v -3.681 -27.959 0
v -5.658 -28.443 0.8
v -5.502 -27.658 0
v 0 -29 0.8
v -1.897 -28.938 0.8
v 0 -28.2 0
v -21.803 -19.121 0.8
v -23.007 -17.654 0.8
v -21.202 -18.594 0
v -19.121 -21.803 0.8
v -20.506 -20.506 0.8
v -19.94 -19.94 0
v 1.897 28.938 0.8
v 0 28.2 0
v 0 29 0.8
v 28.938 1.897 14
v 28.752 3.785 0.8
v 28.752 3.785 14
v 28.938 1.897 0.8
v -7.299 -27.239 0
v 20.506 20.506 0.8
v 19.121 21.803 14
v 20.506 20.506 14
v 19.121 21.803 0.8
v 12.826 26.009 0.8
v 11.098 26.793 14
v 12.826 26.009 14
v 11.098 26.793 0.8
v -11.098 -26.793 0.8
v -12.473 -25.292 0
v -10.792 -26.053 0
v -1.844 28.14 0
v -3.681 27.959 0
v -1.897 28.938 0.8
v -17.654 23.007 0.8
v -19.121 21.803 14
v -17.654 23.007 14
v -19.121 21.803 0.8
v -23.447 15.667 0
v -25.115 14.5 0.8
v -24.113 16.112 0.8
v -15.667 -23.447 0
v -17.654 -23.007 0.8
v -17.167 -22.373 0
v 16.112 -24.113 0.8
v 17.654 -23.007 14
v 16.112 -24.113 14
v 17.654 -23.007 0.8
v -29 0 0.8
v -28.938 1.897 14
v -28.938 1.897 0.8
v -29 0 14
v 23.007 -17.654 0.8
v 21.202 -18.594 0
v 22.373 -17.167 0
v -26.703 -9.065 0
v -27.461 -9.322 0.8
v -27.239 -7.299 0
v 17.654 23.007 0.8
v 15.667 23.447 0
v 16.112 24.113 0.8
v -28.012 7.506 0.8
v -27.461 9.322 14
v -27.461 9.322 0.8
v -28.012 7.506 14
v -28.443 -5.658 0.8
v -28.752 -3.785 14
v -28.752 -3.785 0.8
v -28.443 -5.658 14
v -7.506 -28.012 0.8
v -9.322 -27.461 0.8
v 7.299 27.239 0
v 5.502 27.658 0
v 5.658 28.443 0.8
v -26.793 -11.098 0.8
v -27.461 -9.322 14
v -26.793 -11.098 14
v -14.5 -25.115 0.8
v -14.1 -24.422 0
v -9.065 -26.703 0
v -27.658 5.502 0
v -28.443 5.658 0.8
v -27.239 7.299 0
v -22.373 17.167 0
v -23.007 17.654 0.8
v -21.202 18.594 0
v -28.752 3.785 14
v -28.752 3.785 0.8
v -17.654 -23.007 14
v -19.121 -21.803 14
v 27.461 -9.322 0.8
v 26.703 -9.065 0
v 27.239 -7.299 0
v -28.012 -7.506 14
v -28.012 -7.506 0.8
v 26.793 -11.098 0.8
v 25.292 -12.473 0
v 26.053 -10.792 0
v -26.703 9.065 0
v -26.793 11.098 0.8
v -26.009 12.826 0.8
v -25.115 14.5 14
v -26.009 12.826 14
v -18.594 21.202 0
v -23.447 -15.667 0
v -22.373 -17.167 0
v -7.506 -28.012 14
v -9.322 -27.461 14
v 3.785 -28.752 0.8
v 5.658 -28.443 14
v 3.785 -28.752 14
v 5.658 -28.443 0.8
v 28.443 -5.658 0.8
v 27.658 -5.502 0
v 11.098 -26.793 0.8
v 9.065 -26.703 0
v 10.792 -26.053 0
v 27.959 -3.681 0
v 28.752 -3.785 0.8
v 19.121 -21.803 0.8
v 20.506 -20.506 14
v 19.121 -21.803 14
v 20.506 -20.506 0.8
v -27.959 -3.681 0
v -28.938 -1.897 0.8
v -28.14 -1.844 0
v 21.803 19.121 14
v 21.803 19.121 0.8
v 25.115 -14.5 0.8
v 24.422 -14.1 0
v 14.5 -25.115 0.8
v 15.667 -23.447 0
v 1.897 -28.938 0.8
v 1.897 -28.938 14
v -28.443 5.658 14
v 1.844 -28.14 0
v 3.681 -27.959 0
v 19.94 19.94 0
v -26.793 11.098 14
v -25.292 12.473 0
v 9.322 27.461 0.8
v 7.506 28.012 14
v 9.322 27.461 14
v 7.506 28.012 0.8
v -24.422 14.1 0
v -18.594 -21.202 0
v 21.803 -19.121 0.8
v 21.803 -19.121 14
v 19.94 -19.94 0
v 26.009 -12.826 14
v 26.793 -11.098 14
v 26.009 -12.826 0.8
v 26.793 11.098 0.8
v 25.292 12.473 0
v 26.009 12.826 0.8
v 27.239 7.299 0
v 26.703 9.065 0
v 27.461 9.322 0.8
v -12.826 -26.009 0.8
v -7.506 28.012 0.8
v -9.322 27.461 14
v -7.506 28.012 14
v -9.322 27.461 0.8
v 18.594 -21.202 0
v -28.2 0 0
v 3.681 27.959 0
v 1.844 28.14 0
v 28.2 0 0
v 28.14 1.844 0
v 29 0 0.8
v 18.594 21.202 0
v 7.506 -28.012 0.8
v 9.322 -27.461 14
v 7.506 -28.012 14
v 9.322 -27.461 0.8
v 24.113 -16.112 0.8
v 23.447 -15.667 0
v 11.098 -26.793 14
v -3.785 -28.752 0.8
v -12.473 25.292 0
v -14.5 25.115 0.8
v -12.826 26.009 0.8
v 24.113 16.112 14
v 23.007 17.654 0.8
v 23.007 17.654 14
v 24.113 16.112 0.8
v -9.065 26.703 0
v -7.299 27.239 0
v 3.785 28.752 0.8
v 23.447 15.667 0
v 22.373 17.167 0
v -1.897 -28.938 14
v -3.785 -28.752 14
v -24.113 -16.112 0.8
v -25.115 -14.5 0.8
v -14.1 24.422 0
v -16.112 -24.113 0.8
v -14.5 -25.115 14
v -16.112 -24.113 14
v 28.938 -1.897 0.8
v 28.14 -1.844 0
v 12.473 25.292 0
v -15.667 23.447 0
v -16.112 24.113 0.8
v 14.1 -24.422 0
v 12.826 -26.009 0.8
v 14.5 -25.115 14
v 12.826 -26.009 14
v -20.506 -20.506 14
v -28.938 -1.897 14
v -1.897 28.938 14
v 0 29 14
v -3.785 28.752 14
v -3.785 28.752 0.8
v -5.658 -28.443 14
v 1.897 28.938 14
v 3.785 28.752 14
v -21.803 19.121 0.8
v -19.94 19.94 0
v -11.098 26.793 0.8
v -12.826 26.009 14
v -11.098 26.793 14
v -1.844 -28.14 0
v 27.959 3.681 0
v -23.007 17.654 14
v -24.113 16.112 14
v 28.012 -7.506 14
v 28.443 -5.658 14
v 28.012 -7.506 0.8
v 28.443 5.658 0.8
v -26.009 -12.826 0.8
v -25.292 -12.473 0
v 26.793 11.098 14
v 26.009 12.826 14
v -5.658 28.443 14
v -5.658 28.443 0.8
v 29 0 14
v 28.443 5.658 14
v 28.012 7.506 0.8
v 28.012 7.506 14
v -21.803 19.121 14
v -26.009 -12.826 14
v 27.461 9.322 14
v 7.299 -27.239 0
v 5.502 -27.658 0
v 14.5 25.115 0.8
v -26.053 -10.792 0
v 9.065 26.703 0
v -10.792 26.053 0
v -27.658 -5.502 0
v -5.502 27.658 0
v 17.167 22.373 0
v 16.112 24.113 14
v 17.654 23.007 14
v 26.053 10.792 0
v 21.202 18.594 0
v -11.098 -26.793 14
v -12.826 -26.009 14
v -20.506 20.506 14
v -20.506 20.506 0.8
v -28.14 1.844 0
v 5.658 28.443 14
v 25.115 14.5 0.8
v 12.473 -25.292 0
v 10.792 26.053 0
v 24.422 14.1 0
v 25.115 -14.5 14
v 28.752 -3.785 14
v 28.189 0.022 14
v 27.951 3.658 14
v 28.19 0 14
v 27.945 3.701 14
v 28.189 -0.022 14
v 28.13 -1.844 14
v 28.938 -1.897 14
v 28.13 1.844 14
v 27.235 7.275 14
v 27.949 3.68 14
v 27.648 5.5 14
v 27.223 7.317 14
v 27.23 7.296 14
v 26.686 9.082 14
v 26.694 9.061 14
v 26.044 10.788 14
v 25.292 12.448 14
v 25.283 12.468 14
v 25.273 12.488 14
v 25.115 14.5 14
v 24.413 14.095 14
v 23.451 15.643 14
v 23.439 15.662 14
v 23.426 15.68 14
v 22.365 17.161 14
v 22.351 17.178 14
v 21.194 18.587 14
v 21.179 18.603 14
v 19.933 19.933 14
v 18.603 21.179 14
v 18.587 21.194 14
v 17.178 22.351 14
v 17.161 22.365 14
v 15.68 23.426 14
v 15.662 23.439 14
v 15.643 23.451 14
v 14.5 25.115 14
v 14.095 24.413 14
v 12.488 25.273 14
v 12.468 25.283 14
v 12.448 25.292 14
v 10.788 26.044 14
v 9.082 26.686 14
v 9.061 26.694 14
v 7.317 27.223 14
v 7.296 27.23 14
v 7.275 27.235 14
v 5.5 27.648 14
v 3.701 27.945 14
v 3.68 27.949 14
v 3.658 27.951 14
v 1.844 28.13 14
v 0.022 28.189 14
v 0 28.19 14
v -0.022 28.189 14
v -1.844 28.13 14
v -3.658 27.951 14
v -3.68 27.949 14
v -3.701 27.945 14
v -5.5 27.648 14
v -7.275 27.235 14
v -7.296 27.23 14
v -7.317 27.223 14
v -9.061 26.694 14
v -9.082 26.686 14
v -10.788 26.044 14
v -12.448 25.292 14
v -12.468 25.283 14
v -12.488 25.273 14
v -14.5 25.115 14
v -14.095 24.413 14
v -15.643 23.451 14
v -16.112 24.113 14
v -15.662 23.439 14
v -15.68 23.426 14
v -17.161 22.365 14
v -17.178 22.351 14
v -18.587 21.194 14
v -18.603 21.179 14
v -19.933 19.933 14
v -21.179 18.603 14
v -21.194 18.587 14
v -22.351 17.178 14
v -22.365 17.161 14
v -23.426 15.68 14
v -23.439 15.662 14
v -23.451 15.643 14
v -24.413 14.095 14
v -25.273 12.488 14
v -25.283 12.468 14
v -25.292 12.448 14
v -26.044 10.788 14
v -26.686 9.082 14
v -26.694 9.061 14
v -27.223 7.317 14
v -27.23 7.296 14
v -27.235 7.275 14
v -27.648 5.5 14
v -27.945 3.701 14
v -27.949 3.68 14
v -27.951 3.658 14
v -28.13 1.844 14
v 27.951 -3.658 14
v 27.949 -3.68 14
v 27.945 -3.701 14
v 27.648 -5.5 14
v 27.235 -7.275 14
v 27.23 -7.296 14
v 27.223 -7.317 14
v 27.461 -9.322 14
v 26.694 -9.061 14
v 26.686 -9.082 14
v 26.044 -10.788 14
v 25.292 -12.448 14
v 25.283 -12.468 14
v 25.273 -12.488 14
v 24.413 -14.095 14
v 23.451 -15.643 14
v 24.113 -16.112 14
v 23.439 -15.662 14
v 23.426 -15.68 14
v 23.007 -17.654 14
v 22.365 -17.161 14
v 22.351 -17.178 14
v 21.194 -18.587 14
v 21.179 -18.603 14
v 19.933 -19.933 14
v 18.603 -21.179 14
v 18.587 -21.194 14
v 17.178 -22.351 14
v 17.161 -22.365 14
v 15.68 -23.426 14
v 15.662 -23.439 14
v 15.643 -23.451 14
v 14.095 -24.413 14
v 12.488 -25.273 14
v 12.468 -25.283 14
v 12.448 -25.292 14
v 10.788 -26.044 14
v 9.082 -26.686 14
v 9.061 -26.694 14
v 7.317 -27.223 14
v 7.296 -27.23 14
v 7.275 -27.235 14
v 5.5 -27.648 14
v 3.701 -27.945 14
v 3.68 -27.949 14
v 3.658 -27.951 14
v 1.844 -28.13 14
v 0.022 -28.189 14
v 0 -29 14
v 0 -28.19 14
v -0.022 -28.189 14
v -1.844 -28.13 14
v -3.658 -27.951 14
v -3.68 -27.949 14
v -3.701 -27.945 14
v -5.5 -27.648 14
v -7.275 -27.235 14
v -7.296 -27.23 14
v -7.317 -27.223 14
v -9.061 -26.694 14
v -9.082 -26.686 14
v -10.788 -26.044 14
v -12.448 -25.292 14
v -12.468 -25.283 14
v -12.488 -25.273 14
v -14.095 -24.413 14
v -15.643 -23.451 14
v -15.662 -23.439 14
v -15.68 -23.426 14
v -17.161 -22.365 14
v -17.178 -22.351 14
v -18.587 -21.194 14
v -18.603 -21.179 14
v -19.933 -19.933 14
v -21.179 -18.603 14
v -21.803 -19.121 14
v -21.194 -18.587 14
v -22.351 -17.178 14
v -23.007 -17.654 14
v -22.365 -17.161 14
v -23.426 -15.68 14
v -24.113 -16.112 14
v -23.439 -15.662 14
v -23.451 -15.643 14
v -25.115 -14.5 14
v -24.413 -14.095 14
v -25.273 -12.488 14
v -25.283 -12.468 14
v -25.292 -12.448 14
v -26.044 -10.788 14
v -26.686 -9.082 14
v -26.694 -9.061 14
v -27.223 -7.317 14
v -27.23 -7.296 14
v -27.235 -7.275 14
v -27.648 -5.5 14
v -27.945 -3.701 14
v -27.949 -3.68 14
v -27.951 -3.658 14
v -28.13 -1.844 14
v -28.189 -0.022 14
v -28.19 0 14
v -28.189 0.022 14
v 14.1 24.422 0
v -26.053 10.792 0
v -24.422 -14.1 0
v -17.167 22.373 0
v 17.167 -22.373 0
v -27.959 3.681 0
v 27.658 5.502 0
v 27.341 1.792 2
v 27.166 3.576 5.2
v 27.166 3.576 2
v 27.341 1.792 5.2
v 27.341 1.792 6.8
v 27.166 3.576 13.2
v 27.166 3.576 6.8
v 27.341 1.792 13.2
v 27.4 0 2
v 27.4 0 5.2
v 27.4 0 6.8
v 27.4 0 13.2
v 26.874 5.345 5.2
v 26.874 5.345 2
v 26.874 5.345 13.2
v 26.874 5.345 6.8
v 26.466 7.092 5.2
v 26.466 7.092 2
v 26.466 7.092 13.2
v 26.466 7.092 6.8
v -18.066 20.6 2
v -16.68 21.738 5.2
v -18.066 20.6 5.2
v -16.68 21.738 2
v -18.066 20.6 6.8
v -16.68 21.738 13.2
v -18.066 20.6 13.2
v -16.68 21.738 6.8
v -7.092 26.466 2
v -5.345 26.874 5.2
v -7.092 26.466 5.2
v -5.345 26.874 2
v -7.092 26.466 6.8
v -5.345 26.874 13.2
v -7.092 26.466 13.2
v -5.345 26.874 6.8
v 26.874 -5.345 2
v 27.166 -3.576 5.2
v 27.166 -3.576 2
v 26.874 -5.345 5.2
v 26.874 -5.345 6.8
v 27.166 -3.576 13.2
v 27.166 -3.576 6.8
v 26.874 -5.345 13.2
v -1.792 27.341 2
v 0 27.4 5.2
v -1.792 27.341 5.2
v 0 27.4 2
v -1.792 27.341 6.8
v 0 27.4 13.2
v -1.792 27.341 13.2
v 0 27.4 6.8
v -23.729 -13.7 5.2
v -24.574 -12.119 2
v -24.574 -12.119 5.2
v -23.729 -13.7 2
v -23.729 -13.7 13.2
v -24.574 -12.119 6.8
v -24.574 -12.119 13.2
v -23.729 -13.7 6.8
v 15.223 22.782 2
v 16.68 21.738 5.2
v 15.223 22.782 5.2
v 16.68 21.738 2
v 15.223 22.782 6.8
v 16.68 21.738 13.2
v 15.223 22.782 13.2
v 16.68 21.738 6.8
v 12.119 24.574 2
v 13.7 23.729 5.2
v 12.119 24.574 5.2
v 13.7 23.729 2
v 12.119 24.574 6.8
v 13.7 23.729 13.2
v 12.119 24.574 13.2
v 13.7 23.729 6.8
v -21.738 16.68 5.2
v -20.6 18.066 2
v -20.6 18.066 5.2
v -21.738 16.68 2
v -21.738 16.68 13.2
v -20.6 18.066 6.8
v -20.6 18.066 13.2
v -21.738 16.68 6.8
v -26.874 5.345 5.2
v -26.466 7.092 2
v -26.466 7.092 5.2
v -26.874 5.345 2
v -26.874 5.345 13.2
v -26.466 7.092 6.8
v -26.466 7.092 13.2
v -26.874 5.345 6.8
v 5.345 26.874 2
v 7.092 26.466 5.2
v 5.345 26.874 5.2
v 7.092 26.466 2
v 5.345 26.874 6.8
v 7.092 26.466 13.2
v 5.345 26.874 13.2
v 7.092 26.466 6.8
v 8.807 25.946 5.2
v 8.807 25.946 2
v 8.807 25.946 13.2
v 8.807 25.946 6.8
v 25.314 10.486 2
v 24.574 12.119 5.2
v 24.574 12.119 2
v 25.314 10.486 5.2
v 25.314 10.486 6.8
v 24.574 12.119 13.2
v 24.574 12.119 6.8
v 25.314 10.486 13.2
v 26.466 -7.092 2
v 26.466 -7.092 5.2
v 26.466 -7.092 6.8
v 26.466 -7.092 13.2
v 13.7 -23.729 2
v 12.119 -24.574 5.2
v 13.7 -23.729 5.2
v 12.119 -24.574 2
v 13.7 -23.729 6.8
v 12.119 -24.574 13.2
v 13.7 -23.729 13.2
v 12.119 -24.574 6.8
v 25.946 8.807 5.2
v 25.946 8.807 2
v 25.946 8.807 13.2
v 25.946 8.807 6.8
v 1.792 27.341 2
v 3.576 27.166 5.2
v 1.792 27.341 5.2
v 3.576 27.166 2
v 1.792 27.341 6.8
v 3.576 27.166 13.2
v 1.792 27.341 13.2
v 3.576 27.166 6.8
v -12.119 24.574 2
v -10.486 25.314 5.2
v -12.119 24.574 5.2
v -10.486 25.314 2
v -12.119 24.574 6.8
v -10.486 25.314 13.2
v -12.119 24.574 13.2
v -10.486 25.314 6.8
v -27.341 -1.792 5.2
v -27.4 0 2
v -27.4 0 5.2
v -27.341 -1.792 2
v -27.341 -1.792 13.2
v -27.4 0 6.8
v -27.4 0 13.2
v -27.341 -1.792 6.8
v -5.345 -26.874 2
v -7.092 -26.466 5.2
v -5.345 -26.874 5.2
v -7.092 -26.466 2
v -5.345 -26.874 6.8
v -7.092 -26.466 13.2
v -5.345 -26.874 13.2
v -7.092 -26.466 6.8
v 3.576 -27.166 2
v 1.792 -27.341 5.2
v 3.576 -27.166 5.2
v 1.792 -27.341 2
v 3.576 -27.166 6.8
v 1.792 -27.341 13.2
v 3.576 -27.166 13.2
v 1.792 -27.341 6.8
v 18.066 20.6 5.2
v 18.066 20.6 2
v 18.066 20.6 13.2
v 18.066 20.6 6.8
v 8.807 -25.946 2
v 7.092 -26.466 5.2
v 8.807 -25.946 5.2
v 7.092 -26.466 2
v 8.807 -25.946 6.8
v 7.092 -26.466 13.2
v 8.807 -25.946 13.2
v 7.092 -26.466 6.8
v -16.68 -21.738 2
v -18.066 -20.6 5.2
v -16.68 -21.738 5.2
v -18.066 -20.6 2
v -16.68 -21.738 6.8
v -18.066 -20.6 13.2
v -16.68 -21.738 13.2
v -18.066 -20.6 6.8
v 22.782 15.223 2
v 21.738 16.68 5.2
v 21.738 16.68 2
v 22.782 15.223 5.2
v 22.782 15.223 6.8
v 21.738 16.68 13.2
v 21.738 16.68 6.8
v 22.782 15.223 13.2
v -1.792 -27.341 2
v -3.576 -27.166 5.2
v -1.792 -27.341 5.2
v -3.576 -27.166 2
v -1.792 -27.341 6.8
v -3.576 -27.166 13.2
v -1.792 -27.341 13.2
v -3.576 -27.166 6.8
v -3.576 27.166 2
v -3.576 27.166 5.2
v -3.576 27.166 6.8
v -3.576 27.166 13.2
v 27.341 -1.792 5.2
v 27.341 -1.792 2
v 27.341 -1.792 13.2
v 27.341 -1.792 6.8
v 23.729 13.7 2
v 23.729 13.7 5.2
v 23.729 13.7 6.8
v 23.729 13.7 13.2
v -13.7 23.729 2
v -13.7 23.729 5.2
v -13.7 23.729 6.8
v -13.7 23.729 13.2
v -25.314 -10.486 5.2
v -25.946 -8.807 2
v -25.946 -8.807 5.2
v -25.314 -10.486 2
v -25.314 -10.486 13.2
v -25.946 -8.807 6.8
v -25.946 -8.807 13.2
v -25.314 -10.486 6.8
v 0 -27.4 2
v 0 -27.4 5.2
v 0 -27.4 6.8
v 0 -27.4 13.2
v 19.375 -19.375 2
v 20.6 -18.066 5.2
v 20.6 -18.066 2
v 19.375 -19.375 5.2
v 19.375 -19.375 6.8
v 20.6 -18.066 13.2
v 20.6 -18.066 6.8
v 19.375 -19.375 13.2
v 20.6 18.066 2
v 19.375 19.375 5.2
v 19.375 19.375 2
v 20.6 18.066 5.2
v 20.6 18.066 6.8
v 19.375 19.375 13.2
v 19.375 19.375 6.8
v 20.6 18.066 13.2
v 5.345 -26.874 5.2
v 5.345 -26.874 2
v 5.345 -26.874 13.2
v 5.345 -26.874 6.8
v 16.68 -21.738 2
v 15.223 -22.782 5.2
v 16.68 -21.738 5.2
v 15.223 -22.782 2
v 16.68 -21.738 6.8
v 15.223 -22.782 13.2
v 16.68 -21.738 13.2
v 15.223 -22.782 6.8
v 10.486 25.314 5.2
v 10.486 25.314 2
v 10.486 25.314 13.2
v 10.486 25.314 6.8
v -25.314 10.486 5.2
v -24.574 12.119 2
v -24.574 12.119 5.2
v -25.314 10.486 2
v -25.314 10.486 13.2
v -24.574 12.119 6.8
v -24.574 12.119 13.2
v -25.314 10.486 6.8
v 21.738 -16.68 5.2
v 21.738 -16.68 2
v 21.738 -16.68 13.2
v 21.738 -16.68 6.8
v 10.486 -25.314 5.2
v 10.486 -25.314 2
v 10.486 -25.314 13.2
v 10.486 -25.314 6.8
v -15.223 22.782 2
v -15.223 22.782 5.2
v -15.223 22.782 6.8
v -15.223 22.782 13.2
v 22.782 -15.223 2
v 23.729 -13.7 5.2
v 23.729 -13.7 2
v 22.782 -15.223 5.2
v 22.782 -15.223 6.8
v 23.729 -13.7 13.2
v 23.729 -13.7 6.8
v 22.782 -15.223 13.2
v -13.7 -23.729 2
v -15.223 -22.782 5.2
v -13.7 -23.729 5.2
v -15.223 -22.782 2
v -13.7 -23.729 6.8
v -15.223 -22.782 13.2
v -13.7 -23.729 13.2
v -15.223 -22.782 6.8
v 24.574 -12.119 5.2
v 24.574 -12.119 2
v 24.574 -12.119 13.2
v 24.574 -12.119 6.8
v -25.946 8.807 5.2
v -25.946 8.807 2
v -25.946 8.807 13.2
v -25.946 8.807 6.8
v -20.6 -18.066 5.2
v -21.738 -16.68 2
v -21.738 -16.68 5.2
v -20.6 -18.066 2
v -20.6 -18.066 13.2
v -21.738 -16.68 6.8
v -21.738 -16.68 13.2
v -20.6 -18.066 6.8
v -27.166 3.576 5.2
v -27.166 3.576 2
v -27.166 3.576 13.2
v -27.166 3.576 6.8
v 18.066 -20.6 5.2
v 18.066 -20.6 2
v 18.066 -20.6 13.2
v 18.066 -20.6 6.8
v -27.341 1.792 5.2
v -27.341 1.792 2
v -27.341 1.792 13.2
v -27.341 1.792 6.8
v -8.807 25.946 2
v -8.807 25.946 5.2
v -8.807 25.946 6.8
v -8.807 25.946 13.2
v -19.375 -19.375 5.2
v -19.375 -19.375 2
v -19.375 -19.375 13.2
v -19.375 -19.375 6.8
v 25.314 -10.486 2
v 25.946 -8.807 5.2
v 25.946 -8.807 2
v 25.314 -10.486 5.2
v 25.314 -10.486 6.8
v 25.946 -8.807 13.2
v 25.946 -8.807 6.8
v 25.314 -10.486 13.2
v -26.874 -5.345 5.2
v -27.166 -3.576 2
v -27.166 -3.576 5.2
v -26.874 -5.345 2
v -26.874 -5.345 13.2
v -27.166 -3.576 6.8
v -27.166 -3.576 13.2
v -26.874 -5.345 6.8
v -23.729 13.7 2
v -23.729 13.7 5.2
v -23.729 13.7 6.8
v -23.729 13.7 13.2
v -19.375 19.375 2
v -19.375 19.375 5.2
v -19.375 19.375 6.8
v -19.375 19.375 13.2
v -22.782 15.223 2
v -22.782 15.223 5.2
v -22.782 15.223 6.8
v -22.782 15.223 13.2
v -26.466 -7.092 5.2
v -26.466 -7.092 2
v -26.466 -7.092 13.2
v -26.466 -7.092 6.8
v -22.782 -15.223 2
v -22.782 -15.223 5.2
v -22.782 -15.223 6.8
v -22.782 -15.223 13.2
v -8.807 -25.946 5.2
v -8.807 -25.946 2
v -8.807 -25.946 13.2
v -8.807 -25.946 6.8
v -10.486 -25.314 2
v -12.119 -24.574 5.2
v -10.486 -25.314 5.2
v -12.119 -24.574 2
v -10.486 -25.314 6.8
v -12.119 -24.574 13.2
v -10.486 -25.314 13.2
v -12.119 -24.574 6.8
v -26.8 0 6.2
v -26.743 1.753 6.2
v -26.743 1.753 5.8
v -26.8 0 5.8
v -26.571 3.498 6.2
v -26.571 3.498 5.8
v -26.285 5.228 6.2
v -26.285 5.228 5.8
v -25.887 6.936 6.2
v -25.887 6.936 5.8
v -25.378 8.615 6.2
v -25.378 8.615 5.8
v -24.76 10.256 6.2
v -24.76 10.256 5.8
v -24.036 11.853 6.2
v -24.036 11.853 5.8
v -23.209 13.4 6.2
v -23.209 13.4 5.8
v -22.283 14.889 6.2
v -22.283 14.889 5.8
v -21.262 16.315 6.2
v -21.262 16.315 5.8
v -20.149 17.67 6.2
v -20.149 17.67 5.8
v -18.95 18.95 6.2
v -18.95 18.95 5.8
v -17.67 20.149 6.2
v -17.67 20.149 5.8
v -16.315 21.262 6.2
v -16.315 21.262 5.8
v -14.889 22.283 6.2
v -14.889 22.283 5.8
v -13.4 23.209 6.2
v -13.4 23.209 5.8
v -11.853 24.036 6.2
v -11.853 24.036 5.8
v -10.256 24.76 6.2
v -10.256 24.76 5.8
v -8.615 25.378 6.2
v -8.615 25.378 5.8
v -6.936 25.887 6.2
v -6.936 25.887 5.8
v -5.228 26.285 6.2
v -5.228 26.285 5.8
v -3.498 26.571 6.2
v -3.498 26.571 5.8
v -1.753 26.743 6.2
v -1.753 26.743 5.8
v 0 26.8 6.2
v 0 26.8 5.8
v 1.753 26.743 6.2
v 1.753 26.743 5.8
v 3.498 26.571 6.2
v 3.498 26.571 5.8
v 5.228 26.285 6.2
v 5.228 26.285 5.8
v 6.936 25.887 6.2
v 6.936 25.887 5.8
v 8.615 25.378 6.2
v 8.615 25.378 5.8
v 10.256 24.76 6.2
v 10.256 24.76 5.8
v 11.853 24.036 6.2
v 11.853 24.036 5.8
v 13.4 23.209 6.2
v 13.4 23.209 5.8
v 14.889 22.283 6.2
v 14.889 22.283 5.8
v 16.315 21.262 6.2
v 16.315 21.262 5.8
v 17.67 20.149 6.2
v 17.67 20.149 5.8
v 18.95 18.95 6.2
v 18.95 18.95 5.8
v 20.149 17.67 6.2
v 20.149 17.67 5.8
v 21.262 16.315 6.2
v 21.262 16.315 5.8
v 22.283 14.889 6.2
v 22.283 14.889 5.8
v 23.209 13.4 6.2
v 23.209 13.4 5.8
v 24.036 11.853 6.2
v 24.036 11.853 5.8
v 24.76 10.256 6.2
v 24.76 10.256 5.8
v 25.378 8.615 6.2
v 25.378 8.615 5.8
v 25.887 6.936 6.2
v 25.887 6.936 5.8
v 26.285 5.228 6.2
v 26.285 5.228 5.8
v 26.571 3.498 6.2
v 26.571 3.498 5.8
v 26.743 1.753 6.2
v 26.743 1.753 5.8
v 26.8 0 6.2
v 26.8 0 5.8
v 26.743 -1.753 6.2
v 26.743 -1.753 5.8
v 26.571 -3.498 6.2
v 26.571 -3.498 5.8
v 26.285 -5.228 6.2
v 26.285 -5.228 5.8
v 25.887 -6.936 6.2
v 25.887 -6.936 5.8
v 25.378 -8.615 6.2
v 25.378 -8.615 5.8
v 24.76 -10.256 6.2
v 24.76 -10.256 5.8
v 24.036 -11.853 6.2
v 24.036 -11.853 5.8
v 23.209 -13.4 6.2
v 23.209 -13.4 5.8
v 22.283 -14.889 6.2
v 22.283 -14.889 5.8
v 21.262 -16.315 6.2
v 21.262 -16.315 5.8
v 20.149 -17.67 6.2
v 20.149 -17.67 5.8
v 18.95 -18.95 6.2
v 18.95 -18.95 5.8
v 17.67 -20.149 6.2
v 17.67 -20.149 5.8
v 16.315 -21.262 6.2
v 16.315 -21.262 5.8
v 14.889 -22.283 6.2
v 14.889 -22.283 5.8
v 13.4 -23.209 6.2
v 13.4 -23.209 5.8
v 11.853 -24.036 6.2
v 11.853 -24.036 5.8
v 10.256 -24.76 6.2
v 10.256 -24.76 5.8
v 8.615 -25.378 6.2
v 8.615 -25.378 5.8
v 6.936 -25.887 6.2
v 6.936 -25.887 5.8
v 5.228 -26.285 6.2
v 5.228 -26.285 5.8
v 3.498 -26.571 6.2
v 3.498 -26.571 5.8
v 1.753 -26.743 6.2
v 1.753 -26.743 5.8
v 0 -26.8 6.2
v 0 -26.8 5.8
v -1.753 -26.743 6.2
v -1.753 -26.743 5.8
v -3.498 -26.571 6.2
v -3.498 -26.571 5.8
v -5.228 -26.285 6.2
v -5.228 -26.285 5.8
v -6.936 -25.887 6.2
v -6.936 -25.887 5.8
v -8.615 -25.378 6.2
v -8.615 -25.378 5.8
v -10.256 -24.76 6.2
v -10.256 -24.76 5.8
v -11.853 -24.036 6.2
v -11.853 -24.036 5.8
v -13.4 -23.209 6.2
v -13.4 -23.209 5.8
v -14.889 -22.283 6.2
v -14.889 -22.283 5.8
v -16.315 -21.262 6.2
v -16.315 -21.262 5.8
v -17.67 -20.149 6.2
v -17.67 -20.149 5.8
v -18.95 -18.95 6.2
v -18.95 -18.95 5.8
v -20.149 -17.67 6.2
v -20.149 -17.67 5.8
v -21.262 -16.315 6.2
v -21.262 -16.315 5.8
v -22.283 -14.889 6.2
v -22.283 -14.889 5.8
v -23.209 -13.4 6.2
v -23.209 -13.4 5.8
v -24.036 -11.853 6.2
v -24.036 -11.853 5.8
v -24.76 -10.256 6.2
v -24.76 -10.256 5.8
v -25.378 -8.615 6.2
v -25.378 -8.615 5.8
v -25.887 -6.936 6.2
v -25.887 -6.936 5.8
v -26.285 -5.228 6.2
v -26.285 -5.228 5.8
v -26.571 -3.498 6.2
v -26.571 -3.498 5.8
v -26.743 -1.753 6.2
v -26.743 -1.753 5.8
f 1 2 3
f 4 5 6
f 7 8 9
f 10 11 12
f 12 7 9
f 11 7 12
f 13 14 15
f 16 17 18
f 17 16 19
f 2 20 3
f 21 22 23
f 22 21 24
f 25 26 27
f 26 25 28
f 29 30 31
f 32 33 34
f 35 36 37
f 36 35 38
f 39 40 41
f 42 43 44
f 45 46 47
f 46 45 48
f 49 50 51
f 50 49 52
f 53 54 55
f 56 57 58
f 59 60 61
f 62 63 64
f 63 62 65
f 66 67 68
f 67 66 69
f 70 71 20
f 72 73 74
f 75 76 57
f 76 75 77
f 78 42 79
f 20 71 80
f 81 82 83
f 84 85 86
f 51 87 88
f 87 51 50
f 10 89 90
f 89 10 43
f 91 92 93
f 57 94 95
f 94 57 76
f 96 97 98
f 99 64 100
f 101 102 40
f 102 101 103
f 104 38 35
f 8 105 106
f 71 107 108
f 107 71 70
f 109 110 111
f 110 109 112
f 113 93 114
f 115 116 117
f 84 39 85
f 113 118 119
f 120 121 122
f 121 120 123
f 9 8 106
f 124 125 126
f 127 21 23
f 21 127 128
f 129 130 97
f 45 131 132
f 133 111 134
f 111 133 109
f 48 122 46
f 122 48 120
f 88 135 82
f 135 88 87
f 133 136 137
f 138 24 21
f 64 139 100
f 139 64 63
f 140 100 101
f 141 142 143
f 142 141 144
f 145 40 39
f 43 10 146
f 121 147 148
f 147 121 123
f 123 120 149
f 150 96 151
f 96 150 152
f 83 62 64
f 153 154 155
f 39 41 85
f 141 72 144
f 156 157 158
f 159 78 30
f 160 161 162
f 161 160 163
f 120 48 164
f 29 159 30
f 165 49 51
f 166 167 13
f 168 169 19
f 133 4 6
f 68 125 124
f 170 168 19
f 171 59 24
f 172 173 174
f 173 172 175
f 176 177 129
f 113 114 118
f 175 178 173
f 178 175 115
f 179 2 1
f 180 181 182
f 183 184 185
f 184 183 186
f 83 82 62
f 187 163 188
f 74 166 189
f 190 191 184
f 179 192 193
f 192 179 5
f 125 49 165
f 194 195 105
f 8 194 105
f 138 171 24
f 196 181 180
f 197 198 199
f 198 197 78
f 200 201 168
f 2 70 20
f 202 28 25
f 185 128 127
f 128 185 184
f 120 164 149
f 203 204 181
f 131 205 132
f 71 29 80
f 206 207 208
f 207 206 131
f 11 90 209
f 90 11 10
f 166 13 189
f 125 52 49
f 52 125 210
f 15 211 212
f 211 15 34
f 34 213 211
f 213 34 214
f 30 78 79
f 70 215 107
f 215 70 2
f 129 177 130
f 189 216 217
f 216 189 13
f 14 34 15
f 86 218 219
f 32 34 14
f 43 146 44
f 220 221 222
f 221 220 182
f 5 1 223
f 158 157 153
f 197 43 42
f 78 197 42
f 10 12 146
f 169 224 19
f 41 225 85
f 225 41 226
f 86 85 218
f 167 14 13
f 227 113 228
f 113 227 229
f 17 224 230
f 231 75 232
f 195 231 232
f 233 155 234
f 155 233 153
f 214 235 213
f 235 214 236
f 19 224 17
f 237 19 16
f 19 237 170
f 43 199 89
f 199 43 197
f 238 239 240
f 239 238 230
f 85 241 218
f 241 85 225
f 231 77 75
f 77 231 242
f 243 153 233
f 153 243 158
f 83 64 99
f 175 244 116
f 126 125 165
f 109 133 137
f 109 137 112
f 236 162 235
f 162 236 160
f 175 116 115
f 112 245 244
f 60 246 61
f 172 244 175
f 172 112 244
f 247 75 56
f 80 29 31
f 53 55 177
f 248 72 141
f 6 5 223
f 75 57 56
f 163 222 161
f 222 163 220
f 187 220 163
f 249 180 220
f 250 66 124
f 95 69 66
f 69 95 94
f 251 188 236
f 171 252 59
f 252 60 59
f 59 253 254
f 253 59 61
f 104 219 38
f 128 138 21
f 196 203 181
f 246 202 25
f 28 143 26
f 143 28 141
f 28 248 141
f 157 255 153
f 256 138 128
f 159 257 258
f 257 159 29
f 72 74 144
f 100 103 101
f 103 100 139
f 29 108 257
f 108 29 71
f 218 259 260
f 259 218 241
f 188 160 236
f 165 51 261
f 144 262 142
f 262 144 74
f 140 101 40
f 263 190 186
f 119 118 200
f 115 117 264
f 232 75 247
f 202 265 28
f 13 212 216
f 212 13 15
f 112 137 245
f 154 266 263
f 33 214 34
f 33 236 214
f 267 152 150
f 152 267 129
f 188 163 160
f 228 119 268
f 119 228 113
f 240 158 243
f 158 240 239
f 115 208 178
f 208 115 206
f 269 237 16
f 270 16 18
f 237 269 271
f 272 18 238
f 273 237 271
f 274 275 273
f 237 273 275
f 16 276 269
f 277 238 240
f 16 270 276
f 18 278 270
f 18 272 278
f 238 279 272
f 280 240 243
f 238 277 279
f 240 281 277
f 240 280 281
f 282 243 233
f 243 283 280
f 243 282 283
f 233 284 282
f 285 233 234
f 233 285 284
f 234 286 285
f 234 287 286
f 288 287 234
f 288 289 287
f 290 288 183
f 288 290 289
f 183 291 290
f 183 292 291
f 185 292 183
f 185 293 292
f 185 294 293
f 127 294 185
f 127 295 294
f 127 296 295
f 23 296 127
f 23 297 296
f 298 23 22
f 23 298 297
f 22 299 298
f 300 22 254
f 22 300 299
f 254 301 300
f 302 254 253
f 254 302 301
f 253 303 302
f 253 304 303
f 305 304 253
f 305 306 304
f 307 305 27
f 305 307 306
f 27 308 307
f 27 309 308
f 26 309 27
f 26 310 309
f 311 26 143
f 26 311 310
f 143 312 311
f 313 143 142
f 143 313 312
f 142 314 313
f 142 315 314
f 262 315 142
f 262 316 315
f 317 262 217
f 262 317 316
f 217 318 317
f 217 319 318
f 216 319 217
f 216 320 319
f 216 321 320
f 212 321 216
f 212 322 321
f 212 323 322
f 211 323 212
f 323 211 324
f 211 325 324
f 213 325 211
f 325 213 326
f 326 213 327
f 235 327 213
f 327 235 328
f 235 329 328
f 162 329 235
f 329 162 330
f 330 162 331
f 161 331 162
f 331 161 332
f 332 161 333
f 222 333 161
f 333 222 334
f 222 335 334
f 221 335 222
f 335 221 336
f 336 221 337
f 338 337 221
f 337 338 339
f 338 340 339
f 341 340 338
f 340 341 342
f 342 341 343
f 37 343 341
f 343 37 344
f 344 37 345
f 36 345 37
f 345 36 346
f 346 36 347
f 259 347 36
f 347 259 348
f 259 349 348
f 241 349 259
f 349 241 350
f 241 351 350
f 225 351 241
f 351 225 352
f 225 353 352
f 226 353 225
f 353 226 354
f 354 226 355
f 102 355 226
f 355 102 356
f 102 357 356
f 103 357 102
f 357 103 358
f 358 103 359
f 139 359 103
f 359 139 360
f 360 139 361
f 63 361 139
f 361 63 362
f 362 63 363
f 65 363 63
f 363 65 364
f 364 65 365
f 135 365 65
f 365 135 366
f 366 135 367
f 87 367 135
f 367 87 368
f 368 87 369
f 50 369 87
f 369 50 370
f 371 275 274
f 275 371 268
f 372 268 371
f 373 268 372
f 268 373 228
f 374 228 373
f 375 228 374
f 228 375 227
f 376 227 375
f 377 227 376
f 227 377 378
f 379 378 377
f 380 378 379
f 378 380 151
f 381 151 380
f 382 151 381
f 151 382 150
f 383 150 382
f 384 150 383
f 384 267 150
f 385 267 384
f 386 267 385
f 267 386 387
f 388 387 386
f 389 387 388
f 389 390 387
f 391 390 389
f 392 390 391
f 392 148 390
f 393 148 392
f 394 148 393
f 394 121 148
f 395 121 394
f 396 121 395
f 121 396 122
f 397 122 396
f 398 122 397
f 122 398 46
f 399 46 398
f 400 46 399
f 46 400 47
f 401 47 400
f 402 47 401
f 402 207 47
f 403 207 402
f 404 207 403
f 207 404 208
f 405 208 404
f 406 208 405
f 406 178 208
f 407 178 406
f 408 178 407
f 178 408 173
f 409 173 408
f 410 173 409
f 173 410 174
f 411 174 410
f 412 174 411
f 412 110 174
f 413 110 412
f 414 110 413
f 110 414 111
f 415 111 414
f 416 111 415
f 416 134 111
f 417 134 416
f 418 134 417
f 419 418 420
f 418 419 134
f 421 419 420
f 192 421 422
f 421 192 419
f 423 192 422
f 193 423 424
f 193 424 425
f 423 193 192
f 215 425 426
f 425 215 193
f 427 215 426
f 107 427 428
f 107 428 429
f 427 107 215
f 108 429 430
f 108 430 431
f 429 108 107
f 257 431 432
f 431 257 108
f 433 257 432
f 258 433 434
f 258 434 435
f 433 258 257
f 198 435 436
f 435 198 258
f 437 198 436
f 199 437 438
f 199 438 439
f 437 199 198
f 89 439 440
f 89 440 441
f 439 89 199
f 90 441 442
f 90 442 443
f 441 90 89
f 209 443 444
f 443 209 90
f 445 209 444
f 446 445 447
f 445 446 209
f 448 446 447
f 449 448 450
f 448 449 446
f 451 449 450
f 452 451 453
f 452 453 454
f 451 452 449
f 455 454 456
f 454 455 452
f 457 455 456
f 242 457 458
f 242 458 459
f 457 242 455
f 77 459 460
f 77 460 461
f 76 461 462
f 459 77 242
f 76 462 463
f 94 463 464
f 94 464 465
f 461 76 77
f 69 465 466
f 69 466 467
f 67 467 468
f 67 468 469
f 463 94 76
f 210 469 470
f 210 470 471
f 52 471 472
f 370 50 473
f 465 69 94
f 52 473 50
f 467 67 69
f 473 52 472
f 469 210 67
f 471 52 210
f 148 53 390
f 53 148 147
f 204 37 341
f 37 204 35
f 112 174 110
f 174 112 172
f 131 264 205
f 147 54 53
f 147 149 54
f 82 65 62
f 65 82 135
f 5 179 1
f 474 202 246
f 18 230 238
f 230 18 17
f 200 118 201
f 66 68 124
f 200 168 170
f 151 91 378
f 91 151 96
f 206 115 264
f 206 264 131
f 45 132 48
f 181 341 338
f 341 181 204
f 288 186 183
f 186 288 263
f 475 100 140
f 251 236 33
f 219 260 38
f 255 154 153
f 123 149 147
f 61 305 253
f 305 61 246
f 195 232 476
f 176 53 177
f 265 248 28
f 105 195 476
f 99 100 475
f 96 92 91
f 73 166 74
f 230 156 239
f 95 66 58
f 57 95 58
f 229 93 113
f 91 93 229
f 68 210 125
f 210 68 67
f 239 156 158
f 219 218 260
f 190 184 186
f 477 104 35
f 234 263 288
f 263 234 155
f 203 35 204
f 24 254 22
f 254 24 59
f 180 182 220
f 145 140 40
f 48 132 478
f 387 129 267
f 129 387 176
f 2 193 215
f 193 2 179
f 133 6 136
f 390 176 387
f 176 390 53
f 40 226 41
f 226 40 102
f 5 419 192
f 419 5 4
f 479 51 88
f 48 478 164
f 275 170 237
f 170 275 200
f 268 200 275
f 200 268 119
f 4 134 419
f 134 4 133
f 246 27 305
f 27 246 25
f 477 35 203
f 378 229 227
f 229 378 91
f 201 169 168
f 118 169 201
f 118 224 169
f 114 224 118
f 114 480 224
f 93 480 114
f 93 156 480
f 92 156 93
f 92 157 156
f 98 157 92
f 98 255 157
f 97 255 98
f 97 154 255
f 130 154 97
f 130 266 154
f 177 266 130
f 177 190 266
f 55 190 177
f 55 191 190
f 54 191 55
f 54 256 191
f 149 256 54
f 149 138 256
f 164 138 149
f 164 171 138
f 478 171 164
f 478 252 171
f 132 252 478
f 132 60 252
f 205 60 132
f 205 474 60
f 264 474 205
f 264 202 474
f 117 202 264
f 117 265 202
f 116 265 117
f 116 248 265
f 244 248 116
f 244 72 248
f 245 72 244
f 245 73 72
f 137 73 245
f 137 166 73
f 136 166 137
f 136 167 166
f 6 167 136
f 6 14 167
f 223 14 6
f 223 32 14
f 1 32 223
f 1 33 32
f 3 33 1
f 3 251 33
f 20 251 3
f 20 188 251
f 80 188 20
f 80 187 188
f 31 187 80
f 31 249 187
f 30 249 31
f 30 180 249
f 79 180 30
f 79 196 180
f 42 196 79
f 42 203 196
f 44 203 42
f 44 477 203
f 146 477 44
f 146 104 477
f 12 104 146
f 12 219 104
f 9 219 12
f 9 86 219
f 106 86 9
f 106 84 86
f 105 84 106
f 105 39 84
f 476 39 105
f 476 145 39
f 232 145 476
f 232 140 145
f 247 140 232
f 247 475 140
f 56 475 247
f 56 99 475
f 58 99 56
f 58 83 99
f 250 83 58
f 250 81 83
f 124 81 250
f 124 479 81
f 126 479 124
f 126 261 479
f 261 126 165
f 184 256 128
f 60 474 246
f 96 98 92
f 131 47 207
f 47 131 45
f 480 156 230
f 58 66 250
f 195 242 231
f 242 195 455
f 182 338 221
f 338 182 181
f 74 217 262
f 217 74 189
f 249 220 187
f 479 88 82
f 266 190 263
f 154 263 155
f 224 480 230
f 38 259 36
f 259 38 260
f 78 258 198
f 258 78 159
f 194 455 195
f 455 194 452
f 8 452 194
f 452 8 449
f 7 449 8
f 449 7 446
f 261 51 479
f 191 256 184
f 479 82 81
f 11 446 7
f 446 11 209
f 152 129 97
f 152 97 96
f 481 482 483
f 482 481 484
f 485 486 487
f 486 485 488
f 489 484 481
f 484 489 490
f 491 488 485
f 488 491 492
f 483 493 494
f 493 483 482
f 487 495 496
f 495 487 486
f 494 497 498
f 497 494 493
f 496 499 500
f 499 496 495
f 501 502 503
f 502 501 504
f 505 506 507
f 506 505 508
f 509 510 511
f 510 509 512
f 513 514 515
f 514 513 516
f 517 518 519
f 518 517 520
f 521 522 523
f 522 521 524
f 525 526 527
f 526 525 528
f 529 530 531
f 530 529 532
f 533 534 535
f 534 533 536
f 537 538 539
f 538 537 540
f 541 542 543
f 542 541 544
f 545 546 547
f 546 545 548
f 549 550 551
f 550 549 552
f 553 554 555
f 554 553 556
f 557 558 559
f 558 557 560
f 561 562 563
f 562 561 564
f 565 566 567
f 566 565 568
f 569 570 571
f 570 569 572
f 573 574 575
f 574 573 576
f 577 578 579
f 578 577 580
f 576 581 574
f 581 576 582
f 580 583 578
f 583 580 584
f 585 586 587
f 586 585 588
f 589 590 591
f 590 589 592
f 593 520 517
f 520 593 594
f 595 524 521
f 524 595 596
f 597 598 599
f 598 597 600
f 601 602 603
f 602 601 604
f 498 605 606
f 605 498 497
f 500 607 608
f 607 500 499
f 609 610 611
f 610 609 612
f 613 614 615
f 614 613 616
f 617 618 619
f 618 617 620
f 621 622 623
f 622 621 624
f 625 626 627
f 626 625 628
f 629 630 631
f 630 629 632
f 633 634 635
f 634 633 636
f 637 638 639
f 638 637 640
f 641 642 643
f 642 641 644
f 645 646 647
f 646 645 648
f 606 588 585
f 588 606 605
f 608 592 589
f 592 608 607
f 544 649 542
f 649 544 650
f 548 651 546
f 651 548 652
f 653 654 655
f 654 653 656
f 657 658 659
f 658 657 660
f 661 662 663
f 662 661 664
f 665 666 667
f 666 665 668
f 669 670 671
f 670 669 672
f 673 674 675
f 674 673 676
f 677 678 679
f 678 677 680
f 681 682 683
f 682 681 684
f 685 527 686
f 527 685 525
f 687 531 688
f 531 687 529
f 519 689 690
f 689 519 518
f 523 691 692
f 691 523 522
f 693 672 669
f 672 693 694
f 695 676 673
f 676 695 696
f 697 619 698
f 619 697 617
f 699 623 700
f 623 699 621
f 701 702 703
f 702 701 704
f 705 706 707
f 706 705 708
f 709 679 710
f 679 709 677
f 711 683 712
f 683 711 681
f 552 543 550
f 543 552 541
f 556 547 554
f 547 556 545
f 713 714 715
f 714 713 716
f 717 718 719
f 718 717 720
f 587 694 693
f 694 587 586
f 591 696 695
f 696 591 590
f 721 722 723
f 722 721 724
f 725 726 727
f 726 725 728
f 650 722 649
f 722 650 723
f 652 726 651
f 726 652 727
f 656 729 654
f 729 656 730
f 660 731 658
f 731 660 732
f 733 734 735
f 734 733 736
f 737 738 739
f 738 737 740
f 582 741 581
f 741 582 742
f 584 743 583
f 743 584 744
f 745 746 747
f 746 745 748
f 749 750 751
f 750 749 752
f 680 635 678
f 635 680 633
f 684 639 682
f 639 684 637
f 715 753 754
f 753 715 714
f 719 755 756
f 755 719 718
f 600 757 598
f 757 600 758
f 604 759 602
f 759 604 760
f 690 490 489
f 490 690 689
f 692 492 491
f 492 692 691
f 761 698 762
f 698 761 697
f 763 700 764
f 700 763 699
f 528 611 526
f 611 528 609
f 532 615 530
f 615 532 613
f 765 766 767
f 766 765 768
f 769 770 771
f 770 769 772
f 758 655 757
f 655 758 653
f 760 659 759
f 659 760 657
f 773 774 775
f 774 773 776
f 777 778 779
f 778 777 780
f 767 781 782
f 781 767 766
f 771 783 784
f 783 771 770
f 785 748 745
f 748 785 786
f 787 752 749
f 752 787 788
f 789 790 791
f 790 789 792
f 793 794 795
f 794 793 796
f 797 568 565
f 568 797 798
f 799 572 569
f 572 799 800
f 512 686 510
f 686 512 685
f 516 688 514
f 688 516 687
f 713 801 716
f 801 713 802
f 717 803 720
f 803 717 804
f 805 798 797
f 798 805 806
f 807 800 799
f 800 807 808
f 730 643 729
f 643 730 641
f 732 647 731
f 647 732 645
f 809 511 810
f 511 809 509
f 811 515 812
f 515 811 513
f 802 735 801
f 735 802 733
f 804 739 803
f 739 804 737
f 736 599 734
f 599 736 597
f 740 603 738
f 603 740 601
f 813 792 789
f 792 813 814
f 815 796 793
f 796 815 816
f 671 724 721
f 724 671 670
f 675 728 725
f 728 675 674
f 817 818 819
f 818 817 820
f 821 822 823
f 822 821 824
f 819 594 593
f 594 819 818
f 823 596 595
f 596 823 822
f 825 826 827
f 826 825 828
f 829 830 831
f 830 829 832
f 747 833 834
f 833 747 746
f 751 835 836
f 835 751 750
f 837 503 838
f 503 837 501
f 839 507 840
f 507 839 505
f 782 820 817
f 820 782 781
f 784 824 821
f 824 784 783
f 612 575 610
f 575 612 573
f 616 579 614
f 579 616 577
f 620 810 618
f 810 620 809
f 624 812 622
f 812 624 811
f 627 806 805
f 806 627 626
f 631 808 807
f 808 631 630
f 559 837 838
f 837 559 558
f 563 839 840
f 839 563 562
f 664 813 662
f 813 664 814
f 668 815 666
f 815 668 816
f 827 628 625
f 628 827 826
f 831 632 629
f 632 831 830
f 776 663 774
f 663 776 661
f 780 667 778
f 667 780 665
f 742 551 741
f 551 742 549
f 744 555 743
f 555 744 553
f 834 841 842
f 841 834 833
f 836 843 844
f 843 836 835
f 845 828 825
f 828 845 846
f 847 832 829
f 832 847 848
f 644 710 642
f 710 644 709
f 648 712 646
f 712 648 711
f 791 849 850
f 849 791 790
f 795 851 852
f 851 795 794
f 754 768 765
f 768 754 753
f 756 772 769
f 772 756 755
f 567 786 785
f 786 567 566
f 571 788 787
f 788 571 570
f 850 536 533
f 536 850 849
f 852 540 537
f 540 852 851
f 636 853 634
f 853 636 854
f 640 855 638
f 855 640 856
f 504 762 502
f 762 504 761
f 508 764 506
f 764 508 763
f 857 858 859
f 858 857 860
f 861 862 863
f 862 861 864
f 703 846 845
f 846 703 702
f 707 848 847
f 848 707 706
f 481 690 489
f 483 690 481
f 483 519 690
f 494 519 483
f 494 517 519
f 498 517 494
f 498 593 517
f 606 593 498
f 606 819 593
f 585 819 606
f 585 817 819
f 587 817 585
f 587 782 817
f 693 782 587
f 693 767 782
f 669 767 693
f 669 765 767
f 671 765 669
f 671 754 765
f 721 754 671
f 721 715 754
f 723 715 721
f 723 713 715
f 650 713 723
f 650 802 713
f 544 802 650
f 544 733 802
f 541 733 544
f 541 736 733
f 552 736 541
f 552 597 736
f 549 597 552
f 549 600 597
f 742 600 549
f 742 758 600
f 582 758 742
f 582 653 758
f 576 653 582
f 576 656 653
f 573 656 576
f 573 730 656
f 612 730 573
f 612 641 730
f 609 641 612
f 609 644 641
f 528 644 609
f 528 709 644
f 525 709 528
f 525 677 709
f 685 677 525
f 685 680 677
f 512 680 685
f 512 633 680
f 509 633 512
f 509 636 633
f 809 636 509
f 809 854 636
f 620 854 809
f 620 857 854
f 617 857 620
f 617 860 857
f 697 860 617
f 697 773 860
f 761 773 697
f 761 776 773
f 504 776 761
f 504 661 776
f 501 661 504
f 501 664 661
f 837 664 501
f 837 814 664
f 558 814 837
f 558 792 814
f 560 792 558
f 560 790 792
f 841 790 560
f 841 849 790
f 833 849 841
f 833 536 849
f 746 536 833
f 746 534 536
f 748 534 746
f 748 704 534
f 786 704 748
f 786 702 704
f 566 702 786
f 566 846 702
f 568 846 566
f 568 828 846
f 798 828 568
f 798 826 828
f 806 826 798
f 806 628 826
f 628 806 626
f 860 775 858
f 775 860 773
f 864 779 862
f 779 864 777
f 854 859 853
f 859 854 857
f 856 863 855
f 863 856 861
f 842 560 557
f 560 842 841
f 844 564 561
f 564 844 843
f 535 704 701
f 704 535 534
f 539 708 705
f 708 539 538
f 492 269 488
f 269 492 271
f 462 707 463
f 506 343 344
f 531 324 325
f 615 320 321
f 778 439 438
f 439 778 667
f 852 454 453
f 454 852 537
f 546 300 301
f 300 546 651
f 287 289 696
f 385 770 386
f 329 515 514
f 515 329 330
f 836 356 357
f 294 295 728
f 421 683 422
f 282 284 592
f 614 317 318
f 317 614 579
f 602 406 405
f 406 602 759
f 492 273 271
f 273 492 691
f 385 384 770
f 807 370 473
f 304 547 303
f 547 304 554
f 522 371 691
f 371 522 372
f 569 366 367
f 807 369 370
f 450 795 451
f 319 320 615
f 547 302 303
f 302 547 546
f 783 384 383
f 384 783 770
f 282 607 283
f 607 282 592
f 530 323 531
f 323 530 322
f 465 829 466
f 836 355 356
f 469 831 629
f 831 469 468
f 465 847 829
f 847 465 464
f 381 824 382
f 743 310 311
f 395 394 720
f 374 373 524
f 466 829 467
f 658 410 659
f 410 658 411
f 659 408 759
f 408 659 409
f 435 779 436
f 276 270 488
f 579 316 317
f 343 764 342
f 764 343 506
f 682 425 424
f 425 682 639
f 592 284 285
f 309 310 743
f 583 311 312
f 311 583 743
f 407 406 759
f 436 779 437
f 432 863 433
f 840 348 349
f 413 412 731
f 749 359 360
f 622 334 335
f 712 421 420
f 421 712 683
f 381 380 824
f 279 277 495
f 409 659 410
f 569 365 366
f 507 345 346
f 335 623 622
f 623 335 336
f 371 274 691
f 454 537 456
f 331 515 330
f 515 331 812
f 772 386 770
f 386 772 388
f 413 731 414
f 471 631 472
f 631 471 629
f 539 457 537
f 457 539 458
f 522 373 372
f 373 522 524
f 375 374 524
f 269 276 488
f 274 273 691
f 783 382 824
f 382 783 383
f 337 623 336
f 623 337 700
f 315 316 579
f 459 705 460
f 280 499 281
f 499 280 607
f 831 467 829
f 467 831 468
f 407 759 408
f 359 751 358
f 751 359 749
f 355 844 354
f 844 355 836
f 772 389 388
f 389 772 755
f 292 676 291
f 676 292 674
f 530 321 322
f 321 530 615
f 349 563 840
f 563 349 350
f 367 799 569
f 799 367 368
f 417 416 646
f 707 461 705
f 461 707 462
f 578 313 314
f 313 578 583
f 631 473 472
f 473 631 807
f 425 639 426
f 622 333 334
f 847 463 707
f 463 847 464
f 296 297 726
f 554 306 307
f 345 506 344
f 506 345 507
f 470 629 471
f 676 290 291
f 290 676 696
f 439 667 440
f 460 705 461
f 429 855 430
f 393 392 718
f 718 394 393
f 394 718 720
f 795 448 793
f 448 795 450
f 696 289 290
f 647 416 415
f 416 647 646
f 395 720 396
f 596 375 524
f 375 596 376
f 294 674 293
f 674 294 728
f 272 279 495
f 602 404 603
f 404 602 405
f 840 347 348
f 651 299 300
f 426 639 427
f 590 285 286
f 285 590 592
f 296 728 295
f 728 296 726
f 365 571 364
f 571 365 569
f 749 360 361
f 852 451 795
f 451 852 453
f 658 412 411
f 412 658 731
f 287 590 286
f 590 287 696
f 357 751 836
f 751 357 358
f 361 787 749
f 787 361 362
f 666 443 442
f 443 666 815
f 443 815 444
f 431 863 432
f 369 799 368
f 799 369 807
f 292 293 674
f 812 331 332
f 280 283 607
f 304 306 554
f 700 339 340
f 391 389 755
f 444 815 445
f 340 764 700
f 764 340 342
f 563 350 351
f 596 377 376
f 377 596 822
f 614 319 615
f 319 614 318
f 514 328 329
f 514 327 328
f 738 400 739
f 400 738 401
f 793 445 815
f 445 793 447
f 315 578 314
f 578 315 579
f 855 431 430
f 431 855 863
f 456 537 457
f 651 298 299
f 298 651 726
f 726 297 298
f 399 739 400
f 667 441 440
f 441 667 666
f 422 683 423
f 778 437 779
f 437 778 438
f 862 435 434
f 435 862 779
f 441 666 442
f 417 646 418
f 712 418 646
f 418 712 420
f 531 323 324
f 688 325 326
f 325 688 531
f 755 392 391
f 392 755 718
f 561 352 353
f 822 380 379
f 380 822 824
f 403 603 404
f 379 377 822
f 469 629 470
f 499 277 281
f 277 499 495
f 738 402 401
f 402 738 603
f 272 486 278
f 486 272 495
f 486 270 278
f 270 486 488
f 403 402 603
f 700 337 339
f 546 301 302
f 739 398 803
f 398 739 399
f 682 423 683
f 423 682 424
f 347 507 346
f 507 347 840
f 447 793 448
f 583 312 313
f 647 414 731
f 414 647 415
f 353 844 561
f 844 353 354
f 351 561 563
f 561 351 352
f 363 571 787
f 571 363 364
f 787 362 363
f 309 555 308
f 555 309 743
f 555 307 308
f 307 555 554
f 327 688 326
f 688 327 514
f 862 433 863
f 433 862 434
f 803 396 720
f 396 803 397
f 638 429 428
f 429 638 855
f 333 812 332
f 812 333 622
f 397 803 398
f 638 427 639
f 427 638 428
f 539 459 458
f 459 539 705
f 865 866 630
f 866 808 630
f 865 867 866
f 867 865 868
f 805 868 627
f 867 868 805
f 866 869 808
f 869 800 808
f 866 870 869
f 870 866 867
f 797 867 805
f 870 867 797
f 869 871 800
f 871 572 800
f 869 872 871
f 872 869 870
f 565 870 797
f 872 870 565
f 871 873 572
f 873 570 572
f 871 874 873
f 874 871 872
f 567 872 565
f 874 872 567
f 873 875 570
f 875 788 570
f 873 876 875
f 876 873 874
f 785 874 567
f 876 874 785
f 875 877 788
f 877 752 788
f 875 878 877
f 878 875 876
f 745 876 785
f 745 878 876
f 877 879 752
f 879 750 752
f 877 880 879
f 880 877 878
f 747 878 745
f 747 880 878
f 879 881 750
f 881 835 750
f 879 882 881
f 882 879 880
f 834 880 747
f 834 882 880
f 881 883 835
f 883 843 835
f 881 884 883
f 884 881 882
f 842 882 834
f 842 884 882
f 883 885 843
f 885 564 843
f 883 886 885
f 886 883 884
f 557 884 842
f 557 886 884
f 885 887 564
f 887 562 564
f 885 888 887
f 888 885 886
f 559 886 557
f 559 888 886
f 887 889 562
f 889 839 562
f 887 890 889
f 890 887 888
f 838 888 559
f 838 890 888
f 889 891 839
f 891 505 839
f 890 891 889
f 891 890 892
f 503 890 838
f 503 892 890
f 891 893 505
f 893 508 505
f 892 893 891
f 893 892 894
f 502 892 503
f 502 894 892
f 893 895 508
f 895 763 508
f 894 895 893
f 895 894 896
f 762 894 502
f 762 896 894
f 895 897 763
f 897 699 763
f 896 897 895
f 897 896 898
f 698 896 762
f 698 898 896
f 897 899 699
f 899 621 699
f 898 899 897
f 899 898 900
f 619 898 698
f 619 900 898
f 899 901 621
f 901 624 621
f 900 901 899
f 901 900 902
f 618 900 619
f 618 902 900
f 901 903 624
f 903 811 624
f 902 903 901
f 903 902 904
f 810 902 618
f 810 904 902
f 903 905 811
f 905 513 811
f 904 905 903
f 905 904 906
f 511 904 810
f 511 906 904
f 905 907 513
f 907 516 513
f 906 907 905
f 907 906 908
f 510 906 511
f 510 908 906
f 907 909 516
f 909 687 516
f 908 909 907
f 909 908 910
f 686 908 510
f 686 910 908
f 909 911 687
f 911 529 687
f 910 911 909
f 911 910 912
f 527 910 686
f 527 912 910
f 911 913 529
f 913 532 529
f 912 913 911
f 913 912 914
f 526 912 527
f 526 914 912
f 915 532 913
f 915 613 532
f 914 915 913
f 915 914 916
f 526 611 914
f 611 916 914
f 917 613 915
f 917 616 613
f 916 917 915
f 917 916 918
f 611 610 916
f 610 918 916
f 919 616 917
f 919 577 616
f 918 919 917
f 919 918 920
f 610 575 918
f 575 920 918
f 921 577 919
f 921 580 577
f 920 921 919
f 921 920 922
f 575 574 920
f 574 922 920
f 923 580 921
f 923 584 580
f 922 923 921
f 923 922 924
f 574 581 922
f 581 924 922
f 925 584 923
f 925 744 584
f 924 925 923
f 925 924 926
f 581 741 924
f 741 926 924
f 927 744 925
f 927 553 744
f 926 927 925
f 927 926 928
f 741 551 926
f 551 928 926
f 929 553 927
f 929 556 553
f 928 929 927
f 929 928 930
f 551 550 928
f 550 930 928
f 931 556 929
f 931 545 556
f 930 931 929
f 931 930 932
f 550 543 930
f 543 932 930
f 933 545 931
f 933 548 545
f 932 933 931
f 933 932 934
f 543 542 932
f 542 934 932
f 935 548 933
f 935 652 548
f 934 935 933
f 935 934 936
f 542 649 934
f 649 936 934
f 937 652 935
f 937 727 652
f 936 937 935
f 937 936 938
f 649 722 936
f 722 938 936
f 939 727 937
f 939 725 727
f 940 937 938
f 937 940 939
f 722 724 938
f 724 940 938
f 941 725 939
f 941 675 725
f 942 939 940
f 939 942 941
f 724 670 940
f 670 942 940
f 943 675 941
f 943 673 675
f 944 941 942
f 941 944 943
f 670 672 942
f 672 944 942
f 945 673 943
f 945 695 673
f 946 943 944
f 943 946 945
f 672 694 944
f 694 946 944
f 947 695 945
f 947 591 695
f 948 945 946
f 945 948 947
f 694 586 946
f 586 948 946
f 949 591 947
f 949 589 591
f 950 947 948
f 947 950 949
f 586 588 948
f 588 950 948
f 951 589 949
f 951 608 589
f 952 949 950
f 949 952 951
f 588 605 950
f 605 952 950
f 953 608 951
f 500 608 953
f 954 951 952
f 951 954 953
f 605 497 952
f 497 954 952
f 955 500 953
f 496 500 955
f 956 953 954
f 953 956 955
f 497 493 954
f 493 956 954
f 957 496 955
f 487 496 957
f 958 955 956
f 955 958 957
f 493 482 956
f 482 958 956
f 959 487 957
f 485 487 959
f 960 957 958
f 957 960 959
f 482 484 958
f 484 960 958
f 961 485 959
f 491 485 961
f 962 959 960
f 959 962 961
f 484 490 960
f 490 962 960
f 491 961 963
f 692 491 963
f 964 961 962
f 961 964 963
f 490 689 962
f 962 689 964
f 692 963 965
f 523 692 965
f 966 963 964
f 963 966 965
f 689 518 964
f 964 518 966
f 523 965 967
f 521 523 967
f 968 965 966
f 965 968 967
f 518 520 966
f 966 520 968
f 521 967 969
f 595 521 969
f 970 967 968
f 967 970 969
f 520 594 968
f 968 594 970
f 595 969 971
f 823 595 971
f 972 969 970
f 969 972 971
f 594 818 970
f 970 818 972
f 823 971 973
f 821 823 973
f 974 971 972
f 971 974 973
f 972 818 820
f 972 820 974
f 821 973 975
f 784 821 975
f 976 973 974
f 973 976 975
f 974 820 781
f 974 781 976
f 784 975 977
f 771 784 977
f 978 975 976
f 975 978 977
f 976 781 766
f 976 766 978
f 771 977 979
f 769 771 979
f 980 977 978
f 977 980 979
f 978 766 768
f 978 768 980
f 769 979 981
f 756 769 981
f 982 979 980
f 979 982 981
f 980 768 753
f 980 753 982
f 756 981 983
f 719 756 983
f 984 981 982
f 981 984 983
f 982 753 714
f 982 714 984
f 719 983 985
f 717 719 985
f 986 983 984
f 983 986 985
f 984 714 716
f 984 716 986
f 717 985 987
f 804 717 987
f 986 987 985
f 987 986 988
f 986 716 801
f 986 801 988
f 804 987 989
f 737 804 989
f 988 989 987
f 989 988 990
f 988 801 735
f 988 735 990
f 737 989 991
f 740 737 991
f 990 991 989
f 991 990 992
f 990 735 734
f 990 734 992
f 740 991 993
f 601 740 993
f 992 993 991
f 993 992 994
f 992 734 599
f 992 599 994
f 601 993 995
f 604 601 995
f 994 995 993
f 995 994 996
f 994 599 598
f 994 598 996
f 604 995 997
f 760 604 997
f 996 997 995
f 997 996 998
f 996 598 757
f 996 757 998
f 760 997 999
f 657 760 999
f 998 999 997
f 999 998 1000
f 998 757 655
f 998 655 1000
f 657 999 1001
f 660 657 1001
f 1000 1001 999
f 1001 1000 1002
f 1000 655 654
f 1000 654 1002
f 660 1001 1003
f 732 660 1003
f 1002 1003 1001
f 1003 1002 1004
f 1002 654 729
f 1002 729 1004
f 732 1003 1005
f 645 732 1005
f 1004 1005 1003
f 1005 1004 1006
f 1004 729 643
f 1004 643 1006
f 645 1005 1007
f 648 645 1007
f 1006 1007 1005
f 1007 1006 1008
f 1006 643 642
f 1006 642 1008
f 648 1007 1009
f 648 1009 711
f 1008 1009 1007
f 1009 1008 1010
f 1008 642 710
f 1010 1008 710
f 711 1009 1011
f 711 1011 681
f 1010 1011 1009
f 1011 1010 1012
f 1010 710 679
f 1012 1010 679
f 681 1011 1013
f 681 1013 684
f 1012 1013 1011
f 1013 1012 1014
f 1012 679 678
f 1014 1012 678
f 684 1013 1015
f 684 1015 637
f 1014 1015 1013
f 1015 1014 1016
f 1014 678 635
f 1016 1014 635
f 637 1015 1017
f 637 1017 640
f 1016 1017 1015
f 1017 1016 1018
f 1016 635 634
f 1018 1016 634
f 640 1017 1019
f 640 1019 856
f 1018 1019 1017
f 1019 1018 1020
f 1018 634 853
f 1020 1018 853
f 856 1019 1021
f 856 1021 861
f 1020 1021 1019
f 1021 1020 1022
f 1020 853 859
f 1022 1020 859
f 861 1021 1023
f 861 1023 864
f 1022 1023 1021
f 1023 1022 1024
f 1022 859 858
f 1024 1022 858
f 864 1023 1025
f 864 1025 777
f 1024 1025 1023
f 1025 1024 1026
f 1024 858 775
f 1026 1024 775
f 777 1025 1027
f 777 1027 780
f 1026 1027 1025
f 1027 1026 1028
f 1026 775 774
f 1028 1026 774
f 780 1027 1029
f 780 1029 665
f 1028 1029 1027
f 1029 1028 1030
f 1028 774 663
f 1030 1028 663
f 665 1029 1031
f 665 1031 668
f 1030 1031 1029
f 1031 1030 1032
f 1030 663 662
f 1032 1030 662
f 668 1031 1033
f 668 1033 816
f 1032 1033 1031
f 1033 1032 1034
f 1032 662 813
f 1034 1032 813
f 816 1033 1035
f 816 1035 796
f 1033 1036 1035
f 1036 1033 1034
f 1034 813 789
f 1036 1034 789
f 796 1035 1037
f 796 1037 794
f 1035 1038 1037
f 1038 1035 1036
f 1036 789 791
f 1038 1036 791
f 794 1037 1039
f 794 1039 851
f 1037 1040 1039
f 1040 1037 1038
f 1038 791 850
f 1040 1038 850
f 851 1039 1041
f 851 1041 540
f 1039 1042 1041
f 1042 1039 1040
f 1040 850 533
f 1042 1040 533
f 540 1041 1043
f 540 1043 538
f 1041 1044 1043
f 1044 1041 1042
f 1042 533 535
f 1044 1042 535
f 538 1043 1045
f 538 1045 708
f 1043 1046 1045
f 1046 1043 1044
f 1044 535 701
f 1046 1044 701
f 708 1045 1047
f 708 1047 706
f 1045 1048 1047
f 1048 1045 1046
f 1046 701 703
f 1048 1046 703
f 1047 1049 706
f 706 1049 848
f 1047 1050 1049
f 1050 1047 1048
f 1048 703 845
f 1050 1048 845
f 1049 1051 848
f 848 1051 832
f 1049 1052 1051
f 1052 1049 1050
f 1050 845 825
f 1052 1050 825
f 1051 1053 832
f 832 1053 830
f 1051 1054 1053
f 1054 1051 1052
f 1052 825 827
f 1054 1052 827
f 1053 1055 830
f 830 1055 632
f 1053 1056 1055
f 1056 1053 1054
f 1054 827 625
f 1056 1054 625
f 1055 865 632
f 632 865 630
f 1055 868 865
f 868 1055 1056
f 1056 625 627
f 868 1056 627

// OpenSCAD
// Beverage can lid / cover - original parametric design (Brian Sacco)
// Prints upside-down (flat top on the bed, skirt pointing up): no supports.
// Fits the double seam of standard aluminium can ends: 202 = 2 2/16" (54.0 mm), 200 = 2 0/16" (50.8 mm), 204 = 2 4/16" (57.2 mm).
rim_d   = 54.0;   // nominal can-end diameter (mm)
clr     = 0.8;    // FDM clearance on the diameter
skirt_h = 12;     // skirt height
wall    = 1.6;
top_t   = 2.0;    // disc thickness
straw_d = 0;      // 0 = solid lid; 8 = straw hole (fits 6 mm straws)
bead    = 0.6;    // snap bead protrusion (45 deg above and below); catches just under the can seam
$fn = 96;

id = rim_d + clr;
od = id + 2 * wall;
bz = top_t + 3.2;   // bead sits just under the can seam (seam height ~3 mm)

difference() {
    hull() {   // outer body with a 0.8 mm 45-degree chamfer on the bed edge
        cylinder(d = od - 1.6, h = 0.01);
        translate([0, 0, 0.8]) cylinder(d = od, h = 0.01);
        translate([0, 0, top_t + skirt_h - 0.01]) cylinder(d = od, h = 0.01);
    }
    translate([0, 0, top_t]) cylinder(d = id, h = skirt_h + 1);                                  // cavity
    translate([0, 0, top_t + skirt_h - 0.8]) cylinder(d1 = id, d2 = id + 1.6, h = 0.81);         // lead-in chamfer
    if (straw_d > 0) translate([0, 0, -1]) cylinder(d = straw_d, h = top_t + 2);
}
// snap bead: ring with 45 deg slopes above and below (self-supporting), embedded 0.5 mm into the wall
translate([0, 0, bz]) rotate_extrude() polygon([
    [id / 2 + 0.5, 0], [id / 2, 0], [id / 2 - bead, bead],
    [id / 2 - bead, bead + 0.4], [id / 2, 2 * bead + 0.4], [id / 2 + 0.5, 2 * bead + 0.4]]);
